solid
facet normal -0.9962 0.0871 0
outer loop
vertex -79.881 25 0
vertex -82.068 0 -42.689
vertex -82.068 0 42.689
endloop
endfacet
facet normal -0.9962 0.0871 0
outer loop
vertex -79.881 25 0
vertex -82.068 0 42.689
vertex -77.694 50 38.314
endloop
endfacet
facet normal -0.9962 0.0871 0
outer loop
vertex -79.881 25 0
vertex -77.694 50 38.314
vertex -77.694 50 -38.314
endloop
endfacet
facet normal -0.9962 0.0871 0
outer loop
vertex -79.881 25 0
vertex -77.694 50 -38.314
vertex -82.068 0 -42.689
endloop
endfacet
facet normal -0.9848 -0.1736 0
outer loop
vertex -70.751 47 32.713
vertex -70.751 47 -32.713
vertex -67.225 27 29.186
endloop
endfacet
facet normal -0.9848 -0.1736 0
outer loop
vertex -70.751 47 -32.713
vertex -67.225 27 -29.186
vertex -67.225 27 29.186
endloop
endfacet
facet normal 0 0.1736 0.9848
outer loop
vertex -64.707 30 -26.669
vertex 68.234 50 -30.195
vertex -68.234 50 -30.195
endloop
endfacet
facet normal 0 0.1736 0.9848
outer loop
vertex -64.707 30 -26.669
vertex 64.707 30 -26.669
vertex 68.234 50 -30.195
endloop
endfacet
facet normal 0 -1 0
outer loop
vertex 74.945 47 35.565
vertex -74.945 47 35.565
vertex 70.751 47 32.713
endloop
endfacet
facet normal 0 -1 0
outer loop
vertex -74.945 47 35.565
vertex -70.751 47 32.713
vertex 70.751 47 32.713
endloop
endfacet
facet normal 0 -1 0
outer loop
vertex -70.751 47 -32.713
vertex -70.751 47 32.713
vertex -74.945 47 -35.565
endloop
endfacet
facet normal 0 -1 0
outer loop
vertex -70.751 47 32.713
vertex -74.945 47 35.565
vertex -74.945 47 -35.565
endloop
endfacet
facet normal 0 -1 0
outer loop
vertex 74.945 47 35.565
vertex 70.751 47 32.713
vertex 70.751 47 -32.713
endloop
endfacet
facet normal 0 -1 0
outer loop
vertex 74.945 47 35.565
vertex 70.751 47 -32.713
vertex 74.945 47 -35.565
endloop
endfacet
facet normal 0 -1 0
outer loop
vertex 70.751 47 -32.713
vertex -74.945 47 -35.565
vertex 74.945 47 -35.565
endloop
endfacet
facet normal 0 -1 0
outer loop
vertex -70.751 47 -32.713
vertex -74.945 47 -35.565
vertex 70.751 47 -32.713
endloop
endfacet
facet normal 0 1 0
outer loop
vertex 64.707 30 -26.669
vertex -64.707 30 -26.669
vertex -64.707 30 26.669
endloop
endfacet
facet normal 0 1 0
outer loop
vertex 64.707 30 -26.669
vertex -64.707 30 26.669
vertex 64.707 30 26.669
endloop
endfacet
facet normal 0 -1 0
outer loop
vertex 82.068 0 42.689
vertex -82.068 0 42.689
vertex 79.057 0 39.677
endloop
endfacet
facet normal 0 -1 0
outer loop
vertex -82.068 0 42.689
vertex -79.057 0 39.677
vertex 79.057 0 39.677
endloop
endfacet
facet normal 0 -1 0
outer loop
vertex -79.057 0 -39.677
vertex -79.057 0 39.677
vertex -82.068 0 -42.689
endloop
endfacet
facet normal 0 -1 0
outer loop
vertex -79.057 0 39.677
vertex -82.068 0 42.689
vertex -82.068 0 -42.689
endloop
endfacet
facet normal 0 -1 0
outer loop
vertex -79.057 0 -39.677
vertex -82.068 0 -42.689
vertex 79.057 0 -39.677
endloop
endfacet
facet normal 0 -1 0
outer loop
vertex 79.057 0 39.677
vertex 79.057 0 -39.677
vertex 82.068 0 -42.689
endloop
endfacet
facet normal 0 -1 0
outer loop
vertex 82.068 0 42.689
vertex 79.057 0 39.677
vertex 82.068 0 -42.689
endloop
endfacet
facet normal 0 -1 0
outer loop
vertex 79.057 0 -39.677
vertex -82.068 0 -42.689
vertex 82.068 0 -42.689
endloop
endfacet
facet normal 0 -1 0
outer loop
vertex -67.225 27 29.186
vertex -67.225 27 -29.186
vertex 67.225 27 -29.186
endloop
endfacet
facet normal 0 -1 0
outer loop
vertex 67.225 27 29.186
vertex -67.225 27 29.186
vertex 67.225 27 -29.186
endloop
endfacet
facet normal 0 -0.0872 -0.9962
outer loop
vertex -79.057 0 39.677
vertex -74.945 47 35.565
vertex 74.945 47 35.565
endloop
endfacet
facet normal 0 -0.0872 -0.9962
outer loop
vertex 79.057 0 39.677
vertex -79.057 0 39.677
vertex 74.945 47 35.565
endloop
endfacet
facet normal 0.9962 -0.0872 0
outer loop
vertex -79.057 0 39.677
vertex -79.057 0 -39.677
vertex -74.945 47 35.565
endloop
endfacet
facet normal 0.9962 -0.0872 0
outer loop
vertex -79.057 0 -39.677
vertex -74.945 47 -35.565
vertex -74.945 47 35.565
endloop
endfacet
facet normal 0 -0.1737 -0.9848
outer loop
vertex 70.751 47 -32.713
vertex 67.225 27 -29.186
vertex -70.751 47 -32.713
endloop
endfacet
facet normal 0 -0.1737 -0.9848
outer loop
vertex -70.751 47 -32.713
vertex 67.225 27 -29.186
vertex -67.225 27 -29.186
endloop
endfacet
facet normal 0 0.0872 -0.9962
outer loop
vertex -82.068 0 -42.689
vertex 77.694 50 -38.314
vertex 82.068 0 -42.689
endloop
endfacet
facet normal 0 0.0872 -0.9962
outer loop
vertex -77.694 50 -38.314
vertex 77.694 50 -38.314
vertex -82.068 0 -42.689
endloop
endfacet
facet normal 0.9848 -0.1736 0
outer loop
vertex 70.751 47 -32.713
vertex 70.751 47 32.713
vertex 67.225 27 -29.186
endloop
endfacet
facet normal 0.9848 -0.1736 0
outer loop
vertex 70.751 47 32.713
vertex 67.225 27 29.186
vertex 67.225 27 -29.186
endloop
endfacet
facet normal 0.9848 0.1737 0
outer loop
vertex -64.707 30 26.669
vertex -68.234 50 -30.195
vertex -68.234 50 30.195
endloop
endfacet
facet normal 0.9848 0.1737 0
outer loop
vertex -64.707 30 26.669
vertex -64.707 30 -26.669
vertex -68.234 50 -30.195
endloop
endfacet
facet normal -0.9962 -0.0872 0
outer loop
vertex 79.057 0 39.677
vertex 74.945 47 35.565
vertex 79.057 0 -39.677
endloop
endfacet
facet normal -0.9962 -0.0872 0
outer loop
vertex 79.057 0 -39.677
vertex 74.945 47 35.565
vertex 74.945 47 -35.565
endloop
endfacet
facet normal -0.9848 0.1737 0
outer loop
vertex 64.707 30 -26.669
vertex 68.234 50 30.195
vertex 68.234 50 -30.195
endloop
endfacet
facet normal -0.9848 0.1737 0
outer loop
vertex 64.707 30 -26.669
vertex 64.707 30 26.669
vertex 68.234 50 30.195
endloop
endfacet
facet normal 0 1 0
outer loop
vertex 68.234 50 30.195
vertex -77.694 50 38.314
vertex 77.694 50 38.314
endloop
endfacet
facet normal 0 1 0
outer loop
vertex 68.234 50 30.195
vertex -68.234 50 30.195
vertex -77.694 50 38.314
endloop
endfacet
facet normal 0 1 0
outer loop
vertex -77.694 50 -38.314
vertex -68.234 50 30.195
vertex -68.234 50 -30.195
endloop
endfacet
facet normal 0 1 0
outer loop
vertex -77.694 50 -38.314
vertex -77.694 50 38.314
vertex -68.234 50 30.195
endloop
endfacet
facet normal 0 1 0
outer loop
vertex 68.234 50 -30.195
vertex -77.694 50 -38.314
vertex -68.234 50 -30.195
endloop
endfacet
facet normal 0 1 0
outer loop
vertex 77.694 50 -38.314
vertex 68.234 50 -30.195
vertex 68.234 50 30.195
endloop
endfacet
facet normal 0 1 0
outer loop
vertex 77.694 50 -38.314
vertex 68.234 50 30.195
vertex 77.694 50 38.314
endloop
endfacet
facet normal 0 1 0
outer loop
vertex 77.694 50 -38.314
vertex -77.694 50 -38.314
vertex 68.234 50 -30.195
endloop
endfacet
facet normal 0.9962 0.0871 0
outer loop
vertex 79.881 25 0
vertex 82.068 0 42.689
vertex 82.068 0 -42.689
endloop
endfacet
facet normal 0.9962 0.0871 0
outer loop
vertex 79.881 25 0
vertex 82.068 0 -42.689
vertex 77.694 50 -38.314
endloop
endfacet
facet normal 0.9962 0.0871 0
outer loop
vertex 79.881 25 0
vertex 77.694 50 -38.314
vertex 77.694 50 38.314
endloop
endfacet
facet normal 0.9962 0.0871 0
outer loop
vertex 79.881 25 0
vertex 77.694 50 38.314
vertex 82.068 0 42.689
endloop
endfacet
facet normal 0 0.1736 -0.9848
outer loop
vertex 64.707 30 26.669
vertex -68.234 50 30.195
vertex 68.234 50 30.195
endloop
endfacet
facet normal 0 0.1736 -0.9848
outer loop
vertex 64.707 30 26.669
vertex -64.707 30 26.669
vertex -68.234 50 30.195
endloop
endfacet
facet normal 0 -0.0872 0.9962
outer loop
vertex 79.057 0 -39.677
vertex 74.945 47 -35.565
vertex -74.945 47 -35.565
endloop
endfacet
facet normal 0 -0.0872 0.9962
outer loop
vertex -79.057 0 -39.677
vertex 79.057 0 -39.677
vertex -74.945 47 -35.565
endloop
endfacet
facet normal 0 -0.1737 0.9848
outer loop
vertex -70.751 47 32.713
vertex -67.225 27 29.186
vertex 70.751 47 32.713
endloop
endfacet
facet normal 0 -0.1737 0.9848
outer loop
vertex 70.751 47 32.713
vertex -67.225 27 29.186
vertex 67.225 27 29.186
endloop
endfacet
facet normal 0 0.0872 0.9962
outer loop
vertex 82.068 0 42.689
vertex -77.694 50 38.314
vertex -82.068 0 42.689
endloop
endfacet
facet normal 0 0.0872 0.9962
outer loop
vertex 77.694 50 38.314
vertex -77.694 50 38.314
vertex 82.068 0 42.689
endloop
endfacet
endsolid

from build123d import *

# Parameters (mm, degrees)
SKETCH1_W           = 164.136897748
SKETCH1_H           = 85.377660522
BOSS_EXTRUDE1_DEPTH = 50
BOSS_EXTRUDE1_TAPER = 5
SKETCH2_W           = 136.467789358
SKETCH2_H           = 60.390918278
CUT_EXTRUDE1_DEPTH  = 20
CUT_EXTRUDE1_TAPER  = 10
SHELL1_T            = -3


with BuildPart() as part:
    # Sketch1 → Boss-Extrude1 (new body)
    with BuildSketch(Plane(origin=(0, 0, 0), x_dir=(1, 0, 0), z_dir=(0, 1, 0))):
        Rectangle(SKETCH1_W, SKETCH1_H)
    extrude(amount=BOSS_EXTRUDE1_DEPTH, taper=BOSS_EXTRUDE1_TAPER)

    # Sketch2 → Cut-Extrude1 (cut)
    with BuildSketch(Plane(origin=(0, 50, 0), x_dir=(1, 0, 0), z_dir=(0, 1, 0))):
        Rectangle(SKETCH2_W, SKETCH2_H)
    extrude(amount=-CUT_EXTRUDE1_DEPTH, taper=CUT_EXTRUDE1_TAPER, mode=Mode.SUBTRACT)

    # Shell1
    shell1_openings = [part.faces().sort_by_distance(p)[0] for p in [
        (0, 0, 0),
    ]]
    offset(amount=SHELL1_T, openings=shell1_openings, kind=Kind.INTERSECTION)


solid = part.part
